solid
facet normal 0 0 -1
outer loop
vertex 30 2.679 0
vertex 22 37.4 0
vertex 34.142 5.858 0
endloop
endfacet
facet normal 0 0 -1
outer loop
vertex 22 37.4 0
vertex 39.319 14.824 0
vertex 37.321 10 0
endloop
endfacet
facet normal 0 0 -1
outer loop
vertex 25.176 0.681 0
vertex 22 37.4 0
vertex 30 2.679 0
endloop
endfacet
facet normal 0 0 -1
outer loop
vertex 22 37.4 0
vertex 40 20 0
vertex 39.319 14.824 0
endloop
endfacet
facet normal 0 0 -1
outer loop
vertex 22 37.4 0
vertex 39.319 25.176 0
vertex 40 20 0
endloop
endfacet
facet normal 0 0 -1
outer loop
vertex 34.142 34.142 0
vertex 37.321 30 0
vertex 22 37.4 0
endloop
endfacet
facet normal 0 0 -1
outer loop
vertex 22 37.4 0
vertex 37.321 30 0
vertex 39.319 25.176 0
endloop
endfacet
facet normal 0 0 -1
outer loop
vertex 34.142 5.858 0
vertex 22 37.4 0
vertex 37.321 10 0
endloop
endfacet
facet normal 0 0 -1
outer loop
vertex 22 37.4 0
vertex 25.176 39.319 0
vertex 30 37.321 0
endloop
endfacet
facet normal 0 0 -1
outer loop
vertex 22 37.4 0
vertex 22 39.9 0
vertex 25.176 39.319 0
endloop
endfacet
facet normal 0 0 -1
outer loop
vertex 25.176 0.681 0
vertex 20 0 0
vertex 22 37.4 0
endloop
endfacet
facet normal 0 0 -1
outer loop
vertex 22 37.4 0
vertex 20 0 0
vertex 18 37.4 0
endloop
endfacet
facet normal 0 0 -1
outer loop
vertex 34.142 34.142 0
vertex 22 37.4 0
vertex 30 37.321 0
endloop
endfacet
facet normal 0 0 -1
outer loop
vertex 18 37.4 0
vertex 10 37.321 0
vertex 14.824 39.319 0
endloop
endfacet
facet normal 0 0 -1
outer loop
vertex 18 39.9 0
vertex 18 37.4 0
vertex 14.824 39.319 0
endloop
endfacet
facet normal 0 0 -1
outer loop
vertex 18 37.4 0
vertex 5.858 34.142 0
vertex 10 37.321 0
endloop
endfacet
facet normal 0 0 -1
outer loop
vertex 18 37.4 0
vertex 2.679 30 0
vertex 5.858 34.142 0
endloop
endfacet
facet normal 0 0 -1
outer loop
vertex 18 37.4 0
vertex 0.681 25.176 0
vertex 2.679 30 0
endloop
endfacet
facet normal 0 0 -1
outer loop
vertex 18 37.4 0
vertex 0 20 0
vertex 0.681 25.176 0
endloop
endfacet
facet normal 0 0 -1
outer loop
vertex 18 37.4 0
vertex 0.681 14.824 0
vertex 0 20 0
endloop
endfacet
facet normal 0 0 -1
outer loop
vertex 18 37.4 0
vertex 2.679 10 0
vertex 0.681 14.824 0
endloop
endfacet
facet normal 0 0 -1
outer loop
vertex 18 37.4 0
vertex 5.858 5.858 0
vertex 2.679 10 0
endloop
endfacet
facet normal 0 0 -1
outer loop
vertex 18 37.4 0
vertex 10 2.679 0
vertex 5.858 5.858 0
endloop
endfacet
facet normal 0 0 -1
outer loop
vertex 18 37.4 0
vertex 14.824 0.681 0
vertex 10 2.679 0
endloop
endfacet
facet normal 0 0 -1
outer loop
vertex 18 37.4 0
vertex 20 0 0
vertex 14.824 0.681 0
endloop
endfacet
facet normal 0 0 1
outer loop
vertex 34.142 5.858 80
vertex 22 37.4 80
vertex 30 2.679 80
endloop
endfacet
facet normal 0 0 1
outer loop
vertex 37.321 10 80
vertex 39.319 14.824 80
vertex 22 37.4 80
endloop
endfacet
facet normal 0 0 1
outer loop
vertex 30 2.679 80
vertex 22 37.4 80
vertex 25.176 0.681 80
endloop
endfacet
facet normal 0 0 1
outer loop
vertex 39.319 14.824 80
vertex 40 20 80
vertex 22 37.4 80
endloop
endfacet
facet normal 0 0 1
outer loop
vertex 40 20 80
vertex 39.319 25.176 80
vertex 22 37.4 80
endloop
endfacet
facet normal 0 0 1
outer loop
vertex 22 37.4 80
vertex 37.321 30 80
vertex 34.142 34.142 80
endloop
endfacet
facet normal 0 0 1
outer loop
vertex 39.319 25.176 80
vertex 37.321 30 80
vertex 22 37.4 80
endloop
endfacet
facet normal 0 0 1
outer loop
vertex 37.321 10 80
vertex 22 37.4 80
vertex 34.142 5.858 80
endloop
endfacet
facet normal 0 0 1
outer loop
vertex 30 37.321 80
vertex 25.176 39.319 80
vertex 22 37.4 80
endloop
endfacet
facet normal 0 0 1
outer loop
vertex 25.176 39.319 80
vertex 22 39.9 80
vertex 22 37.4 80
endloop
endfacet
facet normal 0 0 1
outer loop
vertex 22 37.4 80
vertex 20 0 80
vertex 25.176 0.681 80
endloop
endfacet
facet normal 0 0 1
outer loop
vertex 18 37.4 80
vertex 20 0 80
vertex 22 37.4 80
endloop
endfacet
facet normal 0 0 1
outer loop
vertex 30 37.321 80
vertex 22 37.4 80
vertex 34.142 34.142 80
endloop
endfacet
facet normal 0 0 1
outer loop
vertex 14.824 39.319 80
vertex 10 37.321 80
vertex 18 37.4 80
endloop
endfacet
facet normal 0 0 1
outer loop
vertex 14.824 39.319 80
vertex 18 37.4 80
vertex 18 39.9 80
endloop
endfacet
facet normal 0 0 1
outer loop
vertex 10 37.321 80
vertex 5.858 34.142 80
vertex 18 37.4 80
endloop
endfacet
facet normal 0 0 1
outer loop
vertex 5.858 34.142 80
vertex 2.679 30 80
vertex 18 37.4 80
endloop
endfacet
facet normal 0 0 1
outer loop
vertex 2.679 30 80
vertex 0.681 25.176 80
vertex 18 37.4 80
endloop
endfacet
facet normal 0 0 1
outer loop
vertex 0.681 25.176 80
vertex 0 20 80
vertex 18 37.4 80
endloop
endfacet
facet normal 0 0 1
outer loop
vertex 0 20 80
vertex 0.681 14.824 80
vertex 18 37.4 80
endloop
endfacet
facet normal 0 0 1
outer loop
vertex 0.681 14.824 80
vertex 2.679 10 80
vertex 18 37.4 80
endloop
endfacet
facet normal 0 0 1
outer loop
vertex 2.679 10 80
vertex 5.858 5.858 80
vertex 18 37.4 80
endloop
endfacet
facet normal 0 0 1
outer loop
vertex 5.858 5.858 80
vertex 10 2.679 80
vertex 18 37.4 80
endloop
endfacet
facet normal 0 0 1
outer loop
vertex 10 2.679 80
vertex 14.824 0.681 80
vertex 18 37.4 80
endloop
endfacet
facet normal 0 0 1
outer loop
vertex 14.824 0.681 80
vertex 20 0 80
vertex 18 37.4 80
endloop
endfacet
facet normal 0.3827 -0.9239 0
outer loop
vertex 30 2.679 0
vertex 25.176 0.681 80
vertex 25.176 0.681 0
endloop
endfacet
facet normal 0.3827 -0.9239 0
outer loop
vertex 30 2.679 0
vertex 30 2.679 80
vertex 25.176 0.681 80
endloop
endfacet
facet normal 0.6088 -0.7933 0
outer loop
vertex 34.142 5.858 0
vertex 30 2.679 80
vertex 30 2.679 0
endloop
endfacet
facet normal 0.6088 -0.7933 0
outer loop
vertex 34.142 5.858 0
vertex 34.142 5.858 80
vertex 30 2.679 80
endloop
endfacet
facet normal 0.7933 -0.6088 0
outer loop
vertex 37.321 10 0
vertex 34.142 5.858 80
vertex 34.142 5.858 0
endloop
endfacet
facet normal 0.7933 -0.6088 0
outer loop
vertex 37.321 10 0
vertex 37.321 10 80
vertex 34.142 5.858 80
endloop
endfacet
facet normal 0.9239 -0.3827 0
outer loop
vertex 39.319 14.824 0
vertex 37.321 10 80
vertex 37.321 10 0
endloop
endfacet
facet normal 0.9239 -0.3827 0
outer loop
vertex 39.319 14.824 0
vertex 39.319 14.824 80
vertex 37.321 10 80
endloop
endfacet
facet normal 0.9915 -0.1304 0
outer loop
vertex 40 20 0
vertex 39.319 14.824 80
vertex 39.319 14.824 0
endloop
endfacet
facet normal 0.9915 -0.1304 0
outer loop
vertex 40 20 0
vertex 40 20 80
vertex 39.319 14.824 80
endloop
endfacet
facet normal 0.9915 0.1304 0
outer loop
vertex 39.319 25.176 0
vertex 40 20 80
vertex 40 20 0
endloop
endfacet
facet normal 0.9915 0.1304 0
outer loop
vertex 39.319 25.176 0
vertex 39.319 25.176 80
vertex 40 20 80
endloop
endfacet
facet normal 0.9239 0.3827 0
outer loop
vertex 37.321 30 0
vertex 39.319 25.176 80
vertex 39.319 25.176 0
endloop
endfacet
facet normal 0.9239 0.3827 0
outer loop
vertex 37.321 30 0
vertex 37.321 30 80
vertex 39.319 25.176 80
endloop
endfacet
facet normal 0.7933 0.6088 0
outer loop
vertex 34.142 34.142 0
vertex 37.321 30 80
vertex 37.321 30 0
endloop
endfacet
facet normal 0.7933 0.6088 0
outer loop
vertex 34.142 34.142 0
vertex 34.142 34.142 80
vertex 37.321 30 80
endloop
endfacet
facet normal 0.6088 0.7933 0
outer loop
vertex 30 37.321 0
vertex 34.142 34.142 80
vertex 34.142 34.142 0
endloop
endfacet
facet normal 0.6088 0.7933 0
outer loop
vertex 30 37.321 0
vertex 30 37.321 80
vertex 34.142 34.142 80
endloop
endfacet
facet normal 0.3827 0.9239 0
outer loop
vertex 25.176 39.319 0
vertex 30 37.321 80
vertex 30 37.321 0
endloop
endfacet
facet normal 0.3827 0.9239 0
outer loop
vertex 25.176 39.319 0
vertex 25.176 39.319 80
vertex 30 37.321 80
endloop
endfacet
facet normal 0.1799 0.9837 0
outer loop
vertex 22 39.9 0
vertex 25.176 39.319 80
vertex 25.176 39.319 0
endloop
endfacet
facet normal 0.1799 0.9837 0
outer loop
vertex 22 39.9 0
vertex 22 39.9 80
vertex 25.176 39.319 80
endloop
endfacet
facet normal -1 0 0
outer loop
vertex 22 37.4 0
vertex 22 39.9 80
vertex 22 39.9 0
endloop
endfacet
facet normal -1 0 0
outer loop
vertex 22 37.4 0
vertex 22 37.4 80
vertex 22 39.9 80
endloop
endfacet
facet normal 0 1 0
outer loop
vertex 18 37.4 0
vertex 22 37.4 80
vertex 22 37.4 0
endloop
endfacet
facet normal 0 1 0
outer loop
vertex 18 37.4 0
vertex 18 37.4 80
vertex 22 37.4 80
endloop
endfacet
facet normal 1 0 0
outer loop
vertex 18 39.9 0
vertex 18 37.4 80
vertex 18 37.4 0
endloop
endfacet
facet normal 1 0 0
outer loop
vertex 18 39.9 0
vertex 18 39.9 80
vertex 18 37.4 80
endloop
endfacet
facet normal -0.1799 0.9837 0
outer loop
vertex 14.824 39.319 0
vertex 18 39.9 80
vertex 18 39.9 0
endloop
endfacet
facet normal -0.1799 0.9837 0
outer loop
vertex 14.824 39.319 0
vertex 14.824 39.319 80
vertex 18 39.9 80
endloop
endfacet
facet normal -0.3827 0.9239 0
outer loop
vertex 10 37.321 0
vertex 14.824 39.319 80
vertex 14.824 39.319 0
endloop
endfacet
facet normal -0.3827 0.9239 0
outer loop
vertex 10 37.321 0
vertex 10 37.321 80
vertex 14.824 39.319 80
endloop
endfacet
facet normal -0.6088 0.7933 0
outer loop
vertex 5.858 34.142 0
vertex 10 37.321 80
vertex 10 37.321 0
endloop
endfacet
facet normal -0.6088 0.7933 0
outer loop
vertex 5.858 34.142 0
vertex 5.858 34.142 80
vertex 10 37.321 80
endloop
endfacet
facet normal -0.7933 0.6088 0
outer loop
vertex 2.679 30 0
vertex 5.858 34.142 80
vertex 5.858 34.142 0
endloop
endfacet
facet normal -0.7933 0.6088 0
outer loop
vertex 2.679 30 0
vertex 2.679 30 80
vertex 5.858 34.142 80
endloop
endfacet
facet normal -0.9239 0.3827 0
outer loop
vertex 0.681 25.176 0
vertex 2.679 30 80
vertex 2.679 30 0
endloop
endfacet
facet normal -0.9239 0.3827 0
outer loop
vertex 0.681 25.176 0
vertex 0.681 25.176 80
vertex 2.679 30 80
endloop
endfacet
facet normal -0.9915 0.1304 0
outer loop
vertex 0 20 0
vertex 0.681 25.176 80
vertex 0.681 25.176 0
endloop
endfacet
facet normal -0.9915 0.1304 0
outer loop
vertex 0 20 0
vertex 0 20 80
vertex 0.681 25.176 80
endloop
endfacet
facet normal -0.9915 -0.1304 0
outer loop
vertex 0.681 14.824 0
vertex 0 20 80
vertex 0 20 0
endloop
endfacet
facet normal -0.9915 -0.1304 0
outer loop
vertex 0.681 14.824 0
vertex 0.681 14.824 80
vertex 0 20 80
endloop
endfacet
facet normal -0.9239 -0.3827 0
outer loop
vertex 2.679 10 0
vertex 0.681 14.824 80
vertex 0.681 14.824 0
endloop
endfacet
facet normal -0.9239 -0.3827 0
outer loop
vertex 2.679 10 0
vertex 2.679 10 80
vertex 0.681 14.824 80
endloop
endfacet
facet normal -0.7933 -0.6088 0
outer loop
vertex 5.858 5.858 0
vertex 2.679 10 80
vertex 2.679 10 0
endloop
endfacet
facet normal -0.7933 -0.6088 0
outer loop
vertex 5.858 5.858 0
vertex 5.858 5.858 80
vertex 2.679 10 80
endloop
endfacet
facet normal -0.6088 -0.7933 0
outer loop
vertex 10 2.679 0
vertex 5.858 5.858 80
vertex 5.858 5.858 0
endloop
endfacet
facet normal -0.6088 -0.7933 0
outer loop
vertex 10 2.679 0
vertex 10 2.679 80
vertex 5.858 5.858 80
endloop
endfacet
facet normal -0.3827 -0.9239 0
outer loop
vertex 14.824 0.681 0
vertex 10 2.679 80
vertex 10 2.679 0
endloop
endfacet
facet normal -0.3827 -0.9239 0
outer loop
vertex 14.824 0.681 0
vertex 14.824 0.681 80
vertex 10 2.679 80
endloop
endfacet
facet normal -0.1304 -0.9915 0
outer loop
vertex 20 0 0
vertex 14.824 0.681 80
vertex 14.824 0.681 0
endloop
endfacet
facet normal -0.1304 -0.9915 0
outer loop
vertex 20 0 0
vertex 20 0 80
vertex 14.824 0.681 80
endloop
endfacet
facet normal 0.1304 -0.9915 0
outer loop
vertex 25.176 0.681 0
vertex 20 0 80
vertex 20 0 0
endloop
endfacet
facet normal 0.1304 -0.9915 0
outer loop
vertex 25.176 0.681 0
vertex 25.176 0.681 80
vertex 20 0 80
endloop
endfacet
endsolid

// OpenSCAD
$fn = 32;

// ----------------------------------------------------------------------
// Keyway shaft: d40 shaft, key 4 x 2.5 mm
// ----------------------------------------------------------------------

// --- parameters (mm) ---
shaft_r = 20;             // shaft radius
key_w = 4;                // keyway width
key_d = 2.5;              // keyway depth below the surface line
plate_t = 80;             // shaft length, Z (extrusion height)

shaft_d = 2 * shaft_r;  // shaft diameter
circle_step = 15;  // polygon sampling step, degrees

profile = [[14.824, 39.319], [10, 37.321], [5.858, 34.142], [2.679, 30], [0.681, 25.176], [0, 20], [0.681, 14.824], [2.679, 10], [5.858, 5.858], [10, 2.679], [14.824, 0.681], [20, 0], [25.176, 0.681], [30, 2.679], [34.142, 5.858], [37.321, 10], [39.319, 14.824], [40, 20], [39.319, 25.176], [37.321, 30], [34.142, 34.142], [30, 37.321], [25.176, 39.319], [22, 39.9], [22, 37.4], [18, 37.4], [18, 39.9]];  // primary outline, 27 points, counter clockwise

// --- the one profile operation ---
linear_extrude(height = plate_t) polygon(points = profile);
